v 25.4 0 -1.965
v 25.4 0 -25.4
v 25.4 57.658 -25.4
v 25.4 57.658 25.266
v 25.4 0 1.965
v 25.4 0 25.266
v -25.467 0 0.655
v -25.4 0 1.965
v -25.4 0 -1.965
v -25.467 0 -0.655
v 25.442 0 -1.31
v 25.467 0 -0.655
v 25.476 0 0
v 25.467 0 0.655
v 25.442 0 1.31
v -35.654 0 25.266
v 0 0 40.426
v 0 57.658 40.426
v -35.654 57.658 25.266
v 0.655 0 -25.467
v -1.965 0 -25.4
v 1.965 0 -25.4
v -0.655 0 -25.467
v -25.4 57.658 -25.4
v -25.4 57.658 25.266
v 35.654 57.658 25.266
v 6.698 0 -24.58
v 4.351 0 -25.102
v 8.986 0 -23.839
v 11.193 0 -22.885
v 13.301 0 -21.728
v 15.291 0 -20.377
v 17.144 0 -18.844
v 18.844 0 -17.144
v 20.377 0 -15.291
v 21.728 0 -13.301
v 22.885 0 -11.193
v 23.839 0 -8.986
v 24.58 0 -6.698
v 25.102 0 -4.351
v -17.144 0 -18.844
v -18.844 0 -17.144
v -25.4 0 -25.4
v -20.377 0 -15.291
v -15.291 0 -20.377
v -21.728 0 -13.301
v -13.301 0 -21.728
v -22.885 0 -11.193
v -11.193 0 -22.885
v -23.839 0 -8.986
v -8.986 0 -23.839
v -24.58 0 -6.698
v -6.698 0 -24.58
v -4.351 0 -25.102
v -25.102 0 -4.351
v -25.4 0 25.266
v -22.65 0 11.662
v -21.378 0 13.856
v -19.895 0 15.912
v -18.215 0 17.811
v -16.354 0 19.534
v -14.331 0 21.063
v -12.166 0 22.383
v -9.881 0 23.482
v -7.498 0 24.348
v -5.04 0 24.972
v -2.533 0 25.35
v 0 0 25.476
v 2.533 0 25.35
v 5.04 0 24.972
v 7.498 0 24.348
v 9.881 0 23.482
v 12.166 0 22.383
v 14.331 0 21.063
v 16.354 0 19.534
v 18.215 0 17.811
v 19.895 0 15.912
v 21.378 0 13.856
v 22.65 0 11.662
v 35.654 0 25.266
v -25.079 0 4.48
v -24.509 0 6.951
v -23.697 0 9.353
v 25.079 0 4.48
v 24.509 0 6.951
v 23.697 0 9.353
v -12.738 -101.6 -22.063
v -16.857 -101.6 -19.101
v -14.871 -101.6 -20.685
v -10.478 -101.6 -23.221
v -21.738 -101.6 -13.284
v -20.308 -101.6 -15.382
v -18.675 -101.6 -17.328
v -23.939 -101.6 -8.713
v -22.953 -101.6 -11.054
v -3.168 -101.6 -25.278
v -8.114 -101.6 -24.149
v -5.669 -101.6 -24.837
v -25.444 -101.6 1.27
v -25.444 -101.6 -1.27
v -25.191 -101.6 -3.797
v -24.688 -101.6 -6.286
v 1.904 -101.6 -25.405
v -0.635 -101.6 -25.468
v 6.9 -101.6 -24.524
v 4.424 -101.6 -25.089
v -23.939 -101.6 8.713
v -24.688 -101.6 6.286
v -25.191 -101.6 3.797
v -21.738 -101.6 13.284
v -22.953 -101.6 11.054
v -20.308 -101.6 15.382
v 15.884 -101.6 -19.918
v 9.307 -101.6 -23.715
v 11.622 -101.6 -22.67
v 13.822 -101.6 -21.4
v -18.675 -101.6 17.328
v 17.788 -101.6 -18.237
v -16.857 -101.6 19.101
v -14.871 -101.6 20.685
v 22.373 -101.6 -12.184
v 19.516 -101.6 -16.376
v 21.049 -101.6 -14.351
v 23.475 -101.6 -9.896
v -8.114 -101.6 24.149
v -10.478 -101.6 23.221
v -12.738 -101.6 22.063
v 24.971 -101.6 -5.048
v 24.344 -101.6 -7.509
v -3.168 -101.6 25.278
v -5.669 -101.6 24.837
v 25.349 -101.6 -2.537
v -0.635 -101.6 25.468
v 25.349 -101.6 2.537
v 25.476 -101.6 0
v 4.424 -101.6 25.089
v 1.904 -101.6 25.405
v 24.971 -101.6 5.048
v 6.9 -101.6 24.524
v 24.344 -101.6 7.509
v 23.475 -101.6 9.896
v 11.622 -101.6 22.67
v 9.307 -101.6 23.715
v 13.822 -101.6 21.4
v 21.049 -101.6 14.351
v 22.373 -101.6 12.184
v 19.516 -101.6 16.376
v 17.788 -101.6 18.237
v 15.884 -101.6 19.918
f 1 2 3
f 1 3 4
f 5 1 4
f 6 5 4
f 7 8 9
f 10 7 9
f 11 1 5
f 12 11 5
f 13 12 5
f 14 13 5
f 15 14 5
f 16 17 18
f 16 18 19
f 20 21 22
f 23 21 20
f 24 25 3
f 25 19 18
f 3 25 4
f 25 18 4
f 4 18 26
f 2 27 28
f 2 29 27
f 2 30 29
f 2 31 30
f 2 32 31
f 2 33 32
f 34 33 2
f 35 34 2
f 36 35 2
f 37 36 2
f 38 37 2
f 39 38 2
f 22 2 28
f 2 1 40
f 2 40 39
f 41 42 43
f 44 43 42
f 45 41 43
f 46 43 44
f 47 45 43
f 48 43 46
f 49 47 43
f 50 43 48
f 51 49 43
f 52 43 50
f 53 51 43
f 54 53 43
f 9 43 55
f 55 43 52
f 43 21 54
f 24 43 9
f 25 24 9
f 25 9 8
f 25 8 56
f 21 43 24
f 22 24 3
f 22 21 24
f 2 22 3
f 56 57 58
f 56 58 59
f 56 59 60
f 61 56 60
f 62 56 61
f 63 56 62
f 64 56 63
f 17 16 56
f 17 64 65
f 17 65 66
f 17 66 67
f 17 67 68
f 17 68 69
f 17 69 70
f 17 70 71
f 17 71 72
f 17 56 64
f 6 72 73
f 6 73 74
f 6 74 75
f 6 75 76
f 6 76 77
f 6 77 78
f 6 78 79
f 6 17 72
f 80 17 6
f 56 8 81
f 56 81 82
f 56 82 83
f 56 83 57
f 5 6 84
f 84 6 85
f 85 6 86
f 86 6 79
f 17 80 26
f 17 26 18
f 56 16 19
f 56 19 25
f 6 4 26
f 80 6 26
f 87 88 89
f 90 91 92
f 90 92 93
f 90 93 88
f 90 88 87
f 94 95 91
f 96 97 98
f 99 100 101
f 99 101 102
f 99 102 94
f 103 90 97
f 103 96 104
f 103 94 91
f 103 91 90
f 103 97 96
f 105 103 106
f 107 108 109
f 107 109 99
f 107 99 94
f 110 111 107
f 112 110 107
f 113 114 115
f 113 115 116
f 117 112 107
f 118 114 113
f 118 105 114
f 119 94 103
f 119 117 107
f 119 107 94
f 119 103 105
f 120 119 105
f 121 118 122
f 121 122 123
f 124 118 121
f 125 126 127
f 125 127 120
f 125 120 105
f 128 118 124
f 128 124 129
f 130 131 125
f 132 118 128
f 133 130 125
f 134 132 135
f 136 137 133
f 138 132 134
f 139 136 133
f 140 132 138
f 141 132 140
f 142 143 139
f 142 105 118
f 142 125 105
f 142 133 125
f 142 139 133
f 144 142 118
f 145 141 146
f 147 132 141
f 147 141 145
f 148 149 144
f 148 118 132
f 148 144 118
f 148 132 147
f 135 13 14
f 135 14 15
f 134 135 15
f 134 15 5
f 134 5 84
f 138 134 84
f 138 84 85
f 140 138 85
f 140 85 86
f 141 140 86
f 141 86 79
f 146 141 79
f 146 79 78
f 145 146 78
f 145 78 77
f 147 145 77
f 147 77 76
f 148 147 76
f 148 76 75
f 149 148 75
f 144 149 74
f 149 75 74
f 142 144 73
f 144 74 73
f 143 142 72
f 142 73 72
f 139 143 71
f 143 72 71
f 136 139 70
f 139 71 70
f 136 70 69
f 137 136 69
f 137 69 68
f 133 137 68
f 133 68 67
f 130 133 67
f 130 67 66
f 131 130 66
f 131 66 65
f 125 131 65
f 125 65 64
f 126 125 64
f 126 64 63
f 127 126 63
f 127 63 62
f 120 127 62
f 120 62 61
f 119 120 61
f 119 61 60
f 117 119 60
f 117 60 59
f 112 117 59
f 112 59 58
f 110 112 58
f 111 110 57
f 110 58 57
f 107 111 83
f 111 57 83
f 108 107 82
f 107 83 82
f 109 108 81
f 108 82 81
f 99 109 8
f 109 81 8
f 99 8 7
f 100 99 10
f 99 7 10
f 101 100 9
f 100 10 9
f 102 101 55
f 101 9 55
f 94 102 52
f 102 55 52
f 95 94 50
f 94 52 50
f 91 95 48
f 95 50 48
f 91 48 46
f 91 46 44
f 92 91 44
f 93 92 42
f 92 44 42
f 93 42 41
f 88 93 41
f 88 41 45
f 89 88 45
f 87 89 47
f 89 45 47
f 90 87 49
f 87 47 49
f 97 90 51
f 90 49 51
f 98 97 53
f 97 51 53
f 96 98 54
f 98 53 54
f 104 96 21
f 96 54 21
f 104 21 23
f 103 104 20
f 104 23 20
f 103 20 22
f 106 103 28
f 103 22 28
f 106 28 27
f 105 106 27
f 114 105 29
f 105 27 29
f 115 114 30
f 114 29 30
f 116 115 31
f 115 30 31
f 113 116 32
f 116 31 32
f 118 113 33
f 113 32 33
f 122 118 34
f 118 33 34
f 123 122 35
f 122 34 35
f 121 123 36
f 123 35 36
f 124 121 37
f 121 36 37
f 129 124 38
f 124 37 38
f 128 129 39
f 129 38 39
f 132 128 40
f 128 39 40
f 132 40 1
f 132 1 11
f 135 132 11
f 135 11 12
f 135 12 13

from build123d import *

# Parameters (mm, degrees)
F0_R     = 25.4758585114
F1_DEPTH = 101.6
F3_W     = 50.8
F3_H     = 50.8
F4_DEPTH = 57.658
F6_DEPTH = 57.658


# Not quite as in the source:
# - the program builds the solid bodies; features that only make, move or delete a surface that nothing else refers to are left out


with BuildPart() as f1:
    # F0 (on Front) → F1 (new body)
    with BuildSketch(Plane.XZ):
        Circle(F0_R)
    extrude(amount=F1_DEPTH)

    # F3 (on Front) → F4 (join)
    with BuildSketch(Plane.XZ):
        Rectangle(F3_W, F3_H)
    extrude(amount=-F4_DEPTH)

    # F5 (on Front) → F6 (join)
    with BuildSketch(Plane.XZ):
        Polygon((35.6535799801, 25.266315788), (0, 40.4261052608), (-35.6535799801, 25.266315788), align=None)
    extrude(amount=-F6_DEPTH)


solid = f1.part
